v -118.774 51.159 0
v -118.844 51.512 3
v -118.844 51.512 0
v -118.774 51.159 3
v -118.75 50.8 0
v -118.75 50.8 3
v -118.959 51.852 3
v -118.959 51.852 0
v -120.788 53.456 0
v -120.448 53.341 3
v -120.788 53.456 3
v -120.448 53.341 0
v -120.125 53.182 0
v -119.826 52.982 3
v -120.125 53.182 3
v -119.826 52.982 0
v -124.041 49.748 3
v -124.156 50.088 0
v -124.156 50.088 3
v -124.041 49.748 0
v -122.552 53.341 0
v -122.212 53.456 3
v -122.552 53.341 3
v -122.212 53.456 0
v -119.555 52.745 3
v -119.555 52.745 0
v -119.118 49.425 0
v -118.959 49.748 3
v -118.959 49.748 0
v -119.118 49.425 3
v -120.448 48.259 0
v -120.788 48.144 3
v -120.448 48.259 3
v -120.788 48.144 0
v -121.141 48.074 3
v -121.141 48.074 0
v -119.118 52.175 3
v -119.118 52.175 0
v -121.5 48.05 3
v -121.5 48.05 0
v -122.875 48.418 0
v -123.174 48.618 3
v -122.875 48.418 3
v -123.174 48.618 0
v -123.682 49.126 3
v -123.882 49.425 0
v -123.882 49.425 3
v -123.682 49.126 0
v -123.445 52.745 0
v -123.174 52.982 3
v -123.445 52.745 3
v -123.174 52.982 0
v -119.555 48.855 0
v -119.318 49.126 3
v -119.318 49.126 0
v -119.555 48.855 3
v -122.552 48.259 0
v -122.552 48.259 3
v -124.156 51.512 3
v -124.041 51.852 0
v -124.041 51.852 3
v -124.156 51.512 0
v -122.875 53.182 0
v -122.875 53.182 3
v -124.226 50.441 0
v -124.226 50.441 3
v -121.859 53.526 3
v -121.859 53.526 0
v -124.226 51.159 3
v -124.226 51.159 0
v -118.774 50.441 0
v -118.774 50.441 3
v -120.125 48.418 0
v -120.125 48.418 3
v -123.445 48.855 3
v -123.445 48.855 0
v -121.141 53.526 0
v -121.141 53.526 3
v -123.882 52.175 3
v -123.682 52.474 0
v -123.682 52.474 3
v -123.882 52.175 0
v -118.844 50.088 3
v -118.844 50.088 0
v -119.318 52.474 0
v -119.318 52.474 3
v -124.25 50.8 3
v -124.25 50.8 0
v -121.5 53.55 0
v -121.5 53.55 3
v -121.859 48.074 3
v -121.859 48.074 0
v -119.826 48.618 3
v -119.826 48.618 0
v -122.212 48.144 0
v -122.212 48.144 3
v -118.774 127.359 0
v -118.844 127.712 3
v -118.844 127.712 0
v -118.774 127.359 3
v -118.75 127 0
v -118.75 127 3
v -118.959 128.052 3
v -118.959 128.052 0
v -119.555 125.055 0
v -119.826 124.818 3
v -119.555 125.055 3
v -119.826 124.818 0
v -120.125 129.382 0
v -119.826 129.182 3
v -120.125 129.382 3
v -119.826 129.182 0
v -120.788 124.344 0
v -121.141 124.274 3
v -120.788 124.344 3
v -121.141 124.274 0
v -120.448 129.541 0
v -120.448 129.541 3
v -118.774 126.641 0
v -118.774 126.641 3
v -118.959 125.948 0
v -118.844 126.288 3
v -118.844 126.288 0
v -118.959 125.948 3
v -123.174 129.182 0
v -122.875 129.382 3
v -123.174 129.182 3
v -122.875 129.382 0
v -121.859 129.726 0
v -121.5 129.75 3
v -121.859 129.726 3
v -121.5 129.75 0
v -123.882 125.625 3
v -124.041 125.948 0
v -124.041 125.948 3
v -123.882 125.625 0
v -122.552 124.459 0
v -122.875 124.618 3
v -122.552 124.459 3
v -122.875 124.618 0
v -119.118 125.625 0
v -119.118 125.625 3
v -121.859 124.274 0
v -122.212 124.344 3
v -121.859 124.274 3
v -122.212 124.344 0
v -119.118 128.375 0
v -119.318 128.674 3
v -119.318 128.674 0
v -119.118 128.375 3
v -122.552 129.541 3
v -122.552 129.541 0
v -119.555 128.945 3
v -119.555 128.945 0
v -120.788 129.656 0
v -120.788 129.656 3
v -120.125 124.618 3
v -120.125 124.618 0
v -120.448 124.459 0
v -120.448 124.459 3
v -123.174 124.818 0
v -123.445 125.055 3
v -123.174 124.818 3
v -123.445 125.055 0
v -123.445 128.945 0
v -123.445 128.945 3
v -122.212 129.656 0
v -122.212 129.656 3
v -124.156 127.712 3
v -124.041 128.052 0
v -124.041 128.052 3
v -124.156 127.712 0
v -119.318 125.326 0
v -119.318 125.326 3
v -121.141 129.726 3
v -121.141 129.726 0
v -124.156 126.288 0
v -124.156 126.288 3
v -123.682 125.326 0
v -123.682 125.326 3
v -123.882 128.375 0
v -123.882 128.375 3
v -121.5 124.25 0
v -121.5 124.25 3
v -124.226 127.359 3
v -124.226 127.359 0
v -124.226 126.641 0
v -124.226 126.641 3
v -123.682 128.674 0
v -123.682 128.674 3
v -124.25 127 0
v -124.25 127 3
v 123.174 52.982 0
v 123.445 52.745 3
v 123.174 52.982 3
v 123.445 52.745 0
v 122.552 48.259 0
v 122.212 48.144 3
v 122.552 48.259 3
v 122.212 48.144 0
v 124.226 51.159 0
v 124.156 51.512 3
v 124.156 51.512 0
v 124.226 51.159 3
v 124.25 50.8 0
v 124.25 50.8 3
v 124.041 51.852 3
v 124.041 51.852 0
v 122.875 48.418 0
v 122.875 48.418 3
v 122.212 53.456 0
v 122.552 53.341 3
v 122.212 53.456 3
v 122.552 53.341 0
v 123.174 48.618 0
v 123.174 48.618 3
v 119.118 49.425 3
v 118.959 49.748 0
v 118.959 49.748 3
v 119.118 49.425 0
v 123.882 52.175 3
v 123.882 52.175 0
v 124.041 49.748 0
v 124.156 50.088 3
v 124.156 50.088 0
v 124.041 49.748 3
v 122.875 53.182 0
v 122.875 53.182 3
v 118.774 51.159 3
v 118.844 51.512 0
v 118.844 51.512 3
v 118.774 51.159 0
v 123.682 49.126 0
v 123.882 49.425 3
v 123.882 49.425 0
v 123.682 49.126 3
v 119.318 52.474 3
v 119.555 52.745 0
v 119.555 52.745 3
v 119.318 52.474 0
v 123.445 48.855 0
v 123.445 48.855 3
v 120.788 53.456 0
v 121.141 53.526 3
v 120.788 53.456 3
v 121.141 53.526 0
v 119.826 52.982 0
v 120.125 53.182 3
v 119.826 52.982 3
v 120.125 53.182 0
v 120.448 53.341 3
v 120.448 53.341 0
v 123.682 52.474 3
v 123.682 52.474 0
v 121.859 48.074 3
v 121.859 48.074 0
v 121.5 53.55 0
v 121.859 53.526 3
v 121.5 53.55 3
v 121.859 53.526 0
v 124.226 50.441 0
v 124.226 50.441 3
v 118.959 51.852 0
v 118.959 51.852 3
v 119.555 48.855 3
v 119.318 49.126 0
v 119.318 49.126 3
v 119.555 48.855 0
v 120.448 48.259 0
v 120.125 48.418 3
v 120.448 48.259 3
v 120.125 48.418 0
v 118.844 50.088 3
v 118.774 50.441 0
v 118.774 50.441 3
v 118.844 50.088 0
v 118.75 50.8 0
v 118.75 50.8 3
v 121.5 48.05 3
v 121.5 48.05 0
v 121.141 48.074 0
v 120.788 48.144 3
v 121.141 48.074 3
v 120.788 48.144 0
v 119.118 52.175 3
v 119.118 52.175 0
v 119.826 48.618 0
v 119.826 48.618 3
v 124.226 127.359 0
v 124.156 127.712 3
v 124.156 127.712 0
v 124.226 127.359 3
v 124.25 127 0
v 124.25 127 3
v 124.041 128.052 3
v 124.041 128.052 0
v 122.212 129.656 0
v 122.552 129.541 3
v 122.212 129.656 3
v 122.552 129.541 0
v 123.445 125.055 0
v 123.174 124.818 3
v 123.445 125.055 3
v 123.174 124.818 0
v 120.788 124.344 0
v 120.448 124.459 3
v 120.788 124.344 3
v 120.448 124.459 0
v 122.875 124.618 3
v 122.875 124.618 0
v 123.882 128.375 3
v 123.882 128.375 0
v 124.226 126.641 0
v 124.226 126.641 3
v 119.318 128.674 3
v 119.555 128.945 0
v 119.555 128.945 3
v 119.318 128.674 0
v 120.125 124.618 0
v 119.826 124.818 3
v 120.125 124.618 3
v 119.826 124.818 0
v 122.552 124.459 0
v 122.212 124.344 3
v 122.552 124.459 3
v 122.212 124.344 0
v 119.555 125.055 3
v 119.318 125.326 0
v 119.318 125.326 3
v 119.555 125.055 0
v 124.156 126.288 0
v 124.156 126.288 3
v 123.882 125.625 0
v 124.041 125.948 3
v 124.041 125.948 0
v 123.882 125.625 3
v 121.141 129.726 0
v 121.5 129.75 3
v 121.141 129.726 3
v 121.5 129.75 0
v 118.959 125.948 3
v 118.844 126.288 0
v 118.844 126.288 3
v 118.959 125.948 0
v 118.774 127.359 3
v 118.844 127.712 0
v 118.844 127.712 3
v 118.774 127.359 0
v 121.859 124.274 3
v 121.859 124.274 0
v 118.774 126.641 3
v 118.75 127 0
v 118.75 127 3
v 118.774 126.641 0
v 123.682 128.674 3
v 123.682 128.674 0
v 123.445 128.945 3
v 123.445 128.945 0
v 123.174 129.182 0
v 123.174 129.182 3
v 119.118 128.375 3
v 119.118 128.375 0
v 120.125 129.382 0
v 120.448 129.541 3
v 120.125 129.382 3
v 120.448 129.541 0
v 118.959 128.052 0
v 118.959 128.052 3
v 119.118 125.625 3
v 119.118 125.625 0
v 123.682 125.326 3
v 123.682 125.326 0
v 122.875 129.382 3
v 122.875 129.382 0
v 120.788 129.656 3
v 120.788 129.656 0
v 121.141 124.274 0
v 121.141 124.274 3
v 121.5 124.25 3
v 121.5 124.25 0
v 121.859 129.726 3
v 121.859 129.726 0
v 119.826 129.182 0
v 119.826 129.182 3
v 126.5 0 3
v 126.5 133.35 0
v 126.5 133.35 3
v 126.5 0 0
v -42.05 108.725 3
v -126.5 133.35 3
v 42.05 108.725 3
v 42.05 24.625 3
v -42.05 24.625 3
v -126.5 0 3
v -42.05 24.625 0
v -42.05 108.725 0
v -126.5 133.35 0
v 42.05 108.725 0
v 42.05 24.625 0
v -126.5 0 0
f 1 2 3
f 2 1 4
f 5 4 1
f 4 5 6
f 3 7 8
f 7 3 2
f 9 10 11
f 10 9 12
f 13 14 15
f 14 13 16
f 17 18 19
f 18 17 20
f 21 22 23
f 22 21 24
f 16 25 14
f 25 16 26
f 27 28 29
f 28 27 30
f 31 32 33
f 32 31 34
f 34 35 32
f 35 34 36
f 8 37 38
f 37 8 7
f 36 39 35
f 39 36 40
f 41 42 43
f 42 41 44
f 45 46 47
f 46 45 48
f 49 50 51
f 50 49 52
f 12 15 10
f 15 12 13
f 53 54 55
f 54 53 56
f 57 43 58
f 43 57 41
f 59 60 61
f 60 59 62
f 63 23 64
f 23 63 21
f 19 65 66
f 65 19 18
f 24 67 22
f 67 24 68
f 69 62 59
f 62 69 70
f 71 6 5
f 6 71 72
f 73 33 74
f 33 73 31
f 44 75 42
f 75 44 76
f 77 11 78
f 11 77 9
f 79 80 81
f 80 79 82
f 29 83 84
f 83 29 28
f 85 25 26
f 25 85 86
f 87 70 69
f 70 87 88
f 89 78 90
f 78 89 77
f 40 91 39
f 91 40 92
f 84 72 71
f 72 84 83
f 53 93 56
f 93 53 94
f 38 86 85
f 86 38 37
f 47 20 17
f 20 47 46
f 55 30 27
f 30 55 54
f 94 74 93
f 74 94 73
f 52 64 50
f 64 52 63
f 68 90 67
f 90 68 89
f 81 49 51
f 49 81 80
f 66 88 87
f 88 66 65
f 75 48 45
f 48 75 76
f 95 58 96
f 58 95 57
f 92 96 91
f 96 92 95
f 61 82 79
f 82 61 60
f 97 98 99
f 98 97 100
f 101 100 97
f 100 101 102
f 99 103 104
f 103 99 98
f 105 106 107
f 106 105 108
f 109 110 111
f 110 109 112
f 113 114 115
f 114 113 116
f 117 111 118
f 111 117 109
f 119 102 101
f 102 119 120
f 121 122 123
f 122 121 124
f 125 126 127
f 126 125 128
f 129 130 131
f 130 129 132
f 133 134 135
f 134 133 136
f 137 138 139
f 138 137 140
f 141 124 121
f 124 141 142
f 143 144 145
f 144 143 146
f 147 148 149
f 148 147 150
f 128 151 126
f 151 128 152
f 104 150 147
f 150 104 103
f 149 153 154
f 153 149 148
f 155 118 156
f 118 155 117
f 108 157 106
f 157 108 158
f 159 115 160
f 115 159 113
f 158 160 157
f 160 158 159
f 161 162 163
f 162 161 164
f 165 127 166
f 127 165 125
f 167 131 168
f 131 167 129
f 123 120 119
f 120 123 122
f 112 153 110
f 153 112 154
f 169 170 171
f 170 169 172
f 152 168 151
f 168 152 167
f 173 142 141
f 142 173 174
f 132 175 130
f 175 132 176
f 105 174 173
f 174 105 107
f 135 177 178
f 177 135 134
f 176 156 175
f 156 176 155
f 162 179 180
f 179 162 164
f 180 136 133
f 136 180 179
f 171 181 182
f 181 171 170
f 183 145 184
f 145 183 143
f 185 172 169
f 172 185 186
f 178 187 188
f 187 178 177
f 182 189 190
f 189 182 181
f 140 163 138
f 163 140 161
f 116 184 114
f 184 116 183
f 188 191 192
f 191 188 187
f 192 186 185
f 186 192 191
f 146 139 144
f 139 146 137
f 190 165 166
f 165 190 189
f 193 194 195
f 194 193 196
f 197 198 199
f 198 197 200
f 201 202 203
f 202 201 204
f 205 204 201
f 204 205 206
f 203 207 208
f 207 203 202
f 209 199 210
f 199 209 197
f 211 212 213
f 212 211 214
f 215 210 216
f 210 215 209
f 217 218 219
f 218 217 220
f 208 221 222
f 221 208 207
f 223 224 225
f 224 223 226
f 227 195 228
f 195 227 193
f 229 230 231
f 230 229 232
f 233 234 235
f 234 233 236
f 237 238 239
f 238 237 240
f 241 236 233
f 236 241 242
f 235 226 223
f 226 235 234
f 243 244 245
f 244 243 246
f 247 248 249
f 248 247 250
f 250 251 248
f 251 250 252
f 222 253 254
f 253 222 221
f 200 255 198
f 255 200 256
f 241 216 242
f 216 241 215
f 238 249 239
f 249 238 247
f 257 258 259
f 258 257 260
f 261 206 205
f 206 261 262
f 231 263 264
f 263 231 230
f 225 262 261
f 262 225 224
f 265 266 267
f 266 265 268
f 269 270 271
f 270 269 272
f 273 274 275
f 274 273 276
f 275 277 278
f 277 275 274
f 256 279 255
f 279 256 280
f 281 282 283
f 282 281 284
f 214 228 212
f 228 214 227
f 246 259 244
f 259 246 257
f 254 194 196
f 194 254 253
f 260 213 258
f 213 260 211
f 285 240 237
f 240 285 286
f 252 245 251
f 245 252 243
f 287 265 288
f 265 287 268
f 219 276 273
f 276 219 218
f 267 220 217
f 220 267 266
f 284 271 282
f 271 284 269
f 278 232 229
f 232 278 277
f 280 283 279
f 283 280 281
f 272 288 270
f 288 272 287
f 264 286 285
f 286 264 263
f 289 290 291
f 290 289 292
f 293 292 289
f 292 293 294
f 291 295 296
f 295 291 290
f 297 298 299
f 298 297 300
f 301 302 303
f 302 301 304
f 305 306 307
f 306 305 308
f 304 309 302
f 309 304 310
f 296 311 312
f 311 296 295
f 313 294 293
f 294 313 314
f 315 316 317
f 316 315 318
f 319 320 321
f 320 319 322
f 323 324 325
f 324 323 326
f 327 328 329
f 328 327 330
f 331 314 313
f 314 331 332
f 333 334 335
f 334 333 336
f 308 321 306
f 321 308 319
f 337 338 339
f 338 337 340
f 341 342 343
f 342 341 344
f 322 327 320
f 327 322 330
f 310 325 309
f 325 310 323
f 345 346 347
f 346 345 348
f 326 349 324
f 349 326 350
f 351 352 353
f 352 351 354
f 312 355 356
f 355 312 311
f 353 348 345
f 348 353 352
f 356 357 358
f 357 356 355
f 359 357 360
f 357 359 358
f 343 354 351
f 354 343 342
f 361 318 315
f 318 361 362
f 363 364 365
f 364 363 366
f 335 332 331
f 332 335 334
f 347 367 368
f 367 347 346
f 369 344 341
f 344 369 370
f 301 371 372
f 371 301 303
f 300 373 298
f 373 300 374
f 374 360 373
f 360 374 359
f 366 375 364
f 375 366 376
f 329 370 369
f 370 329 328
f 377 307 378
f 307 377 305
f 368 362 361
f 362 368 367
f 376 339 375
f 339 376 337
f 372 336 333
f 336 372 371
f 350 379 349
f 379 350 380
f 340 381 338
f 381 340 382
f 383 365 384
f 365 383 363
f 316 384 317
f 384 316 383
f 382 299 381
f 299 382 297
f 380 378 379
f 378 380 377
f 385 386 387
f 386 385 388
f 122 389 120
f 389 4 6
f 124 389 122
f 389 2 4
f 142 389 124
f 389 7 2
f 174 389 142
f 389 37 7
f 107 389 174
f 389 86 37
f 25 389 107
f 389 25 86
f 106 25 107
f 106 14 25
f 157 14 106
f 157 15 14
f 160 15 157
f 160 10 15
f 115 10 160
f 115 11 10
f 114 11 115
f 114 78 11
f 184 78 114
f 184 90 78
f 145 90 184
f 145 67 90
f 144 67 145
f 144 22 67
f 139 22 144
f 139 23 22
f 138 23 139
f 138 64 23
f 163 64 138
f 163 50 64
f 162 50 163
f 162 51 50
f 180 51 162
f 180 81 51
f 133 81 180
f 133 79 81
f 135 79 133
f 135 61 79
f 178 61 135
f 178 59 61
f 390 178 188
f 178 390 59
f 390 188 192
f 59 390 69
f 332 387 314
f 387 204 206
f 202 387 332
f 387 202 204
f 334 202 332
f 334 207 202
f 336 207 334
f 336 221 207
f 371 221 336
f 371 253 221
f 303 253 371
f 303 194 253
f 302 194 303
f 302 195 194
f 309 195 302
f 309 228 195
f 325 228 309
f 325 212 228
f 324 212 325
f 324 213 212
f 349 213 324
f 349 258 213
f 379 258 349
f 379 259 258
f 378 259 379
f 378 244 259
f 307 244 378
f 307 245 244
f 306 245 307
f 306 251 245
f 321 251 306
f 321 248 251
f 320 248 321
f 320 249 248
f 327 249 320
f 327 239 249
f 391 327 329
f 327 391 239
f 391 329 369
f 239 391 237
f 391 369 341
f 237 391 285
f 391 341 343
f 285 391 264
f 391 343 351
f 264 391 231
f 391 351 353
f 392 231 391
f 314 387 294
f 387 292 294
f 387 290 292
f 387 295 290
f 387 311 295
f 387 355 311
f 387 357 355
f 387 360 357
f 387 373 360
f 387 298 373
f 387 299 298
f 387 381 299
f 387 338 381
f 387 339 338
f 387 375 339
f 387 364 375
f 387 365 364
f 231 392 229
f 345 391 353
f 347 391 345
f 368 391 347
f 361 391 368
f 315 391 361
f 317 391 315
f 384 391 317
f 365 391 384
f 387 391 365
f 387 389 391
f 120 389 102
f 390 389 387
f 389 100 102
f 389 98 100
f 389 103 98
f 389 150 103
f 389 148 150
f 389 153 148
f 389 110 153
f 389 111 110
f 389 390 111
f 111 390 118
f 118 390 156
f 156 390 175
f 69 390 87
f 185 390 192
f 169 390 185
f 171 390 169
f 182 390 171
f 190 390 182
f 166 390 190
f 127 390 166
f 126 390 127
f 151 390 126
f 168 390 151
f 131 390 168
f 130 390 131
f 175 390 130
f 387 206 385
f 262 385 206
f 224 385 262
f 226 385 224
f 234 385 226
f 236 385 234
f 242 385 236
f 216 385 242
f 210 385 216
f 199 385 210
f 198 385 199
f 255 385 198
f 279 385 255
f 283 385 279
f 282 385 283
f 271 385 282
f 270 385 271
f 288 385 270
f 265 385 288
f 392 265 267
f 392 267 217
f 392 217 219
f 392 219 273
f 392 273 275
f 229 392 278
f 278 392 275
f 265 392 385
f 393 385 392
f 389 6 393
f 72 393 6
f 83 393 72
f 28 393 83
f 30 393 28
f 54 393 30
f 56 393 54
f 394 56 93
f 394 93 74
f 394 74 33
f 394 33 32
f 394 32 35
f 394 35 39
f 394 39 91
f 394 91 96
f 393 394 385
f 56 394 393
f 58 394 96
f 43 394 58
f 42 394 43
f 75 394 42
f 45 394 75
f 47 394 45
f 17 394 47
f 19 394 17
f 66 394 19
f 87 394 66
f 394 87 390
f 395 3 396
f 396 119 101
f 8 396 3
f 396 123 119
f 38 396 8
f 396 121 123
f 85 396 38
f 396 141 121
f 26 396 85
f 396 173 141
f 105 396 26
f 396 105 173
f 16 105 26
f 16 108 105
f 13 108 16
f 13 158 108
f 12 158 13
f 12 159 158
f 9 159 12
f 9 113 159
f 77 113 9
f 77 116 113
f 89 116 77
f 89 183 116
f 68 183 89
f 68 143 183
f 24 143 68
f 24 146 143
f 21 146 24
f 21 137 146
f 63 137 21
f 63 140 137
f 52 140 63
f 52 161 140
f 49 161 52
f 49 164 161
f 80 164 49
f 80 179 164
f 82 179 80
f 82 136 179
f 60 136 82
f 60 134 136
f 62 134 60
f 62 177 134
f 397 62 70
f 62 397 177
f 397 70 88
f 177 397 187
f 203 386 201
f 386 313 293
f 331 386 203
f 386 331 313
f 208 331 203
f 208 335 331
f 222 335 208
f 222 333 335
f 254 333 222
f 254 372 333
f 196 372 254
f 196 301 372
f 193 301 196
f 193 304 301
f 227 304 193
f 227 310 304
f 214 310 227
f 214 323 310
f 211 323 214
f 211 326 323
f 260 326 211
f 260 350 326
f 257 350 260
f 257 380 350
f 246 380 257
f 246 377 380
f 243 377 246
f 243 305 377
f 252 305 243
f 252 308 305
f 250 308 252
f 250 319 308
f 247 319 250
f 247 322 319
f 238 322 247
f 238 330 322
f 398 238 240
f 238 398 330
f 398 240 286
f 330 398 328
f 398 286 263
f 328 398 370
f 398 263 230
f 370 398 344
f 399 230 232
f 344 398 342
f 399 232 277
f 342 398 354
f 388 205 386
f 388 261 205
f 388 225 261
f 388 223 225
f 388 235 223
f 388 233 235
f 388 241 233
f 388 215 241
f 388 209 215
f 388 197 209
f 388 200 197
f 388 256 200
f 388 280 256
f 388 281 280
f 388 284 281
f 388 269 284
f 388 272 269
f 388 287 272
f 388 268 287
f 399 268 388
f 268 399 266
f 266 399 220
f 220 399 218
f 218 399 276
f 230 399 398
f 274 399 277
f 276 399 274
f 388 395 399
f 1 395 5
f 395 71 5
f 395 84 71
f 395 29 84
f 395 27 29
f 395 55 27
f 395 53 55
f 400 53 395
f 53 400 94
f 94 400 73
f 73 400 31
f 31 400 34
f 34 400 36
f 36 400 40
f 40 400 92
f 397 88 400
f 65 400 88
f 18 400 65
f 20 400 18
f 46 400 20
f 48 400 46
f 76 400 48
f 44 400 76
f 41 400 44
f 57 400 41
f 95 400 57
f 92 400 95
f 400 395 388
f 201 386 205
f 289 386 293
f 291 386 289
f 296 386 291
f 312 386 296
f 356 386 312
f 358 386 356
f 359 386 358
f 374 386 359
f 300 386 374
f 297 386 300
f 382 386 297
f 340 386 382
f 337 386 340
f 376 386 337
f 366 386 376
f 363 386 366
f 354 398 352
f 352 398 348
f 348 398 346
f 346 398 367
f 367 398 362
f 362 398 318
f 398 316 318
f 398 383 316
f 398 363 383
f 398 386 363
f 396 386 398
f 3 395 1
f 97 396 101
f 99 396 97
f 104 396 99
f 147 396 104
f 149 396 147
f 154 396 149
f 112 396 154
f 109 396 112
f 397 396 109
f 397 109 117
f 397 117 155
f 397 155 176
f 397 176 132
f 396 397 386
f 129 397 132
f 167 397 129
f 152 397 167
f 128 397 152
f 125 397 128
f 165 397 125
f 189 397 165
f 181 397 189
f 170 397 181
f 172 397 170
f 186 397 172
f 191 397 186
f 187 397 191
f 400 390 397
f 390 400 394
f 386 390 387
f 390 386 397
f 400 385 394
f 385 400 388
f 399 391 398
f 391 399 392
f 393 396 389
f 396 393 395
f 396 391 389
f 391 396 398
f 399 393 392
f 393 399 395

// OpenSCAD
// =============================================================================
// CONSOLE10 — LCD Simple Faceplate  v0.1  (3U, single 84.1 × 84.1 cutout)
//
// 3U flat 3 mm faceplate that bolts to the cheek SLANT inserts. Single square
// cutout sized for an LCD. No rear sleeve, no clips, no other features.
//
// Origin: split off 2026-05-30 from the multi-device aux faceplate. The other
// devices (CF reader / SD holder / USB-C) moved to
// `Console10_aux_2u_faceplate.scad`.
// =============================================================================

// ---------- module geometry the plate must mate to ----------
panel_width   = 253;
cheek_thick   = 10;
slant_angle   = 30;
U             = 44.45;
interior_half = panel_width/2 - cheek_thick;   // 116.5
cheek_ctr_x   = interior_half + cheek_thick/2; // 121.5

// ---------- flat plate ----------
n_u      = 3;             // 3U faceplate (extends slant base to top)
plate_w  = 253;
plate_h  = n_u * U;       // 133.35
plate_t  = 3;

// ---------- LCD cutout ----------
lcd_w   = 84.1;           // panel-face width
lcd_h   = 84.1;           // panel-face height
lcd_cx  = 0;              // centered horizontally
lcd_cy  = plate_h/2;      // centered vertically

// ---------- slant-insert mount holes ----------
mount_y      = [50.80, 127.00];
m10_32_clear = 5.5;

show_on_slant = false;
floor_t       = 6;

$fn = 48;

echo(str("LCD SIMPLE FACEPLATE v0.1 ", plate_w, " x ", plate_h, " (", n_u, "U) t", plate_t,
         " | LCD cutout ", lcd_w, "x", lcd_h, " @ x=", lcd_cx, " y=", lcd_cy));

// =============================================================================
// PANEL
// =============================================================================
module panel() {
    difference() {
        translate([-plate_w/2, 0, 0]) cube([plate_w, plate_h, plate_t]);

        // LCD cutout
        translate([lcd_cx, lcd_cy, plate_t/2])
            cube([lcd_w, lcd_h, plate_t + 2], center = true);

        // Slant-insert mount screws — 2 per side
        for (sx = [-cheek_ctr_x, cheek_ctr_x])
            for (y = mount_y)
                translate([sx, y, -1]) cylinder(d = m10_32_clear, h = plate_t + 2);
    }
}

// Fit-check: tilt onto 30° slant.
module lcd_on_slant() {
    translate([0, 0, floor_t])
        rotate([90 - slant_angle, 0, 0])
            color("Gainsboro") panel();
}

// Public entry:
module lcd_simple_faceplate_on_slant() { lcd_on_slant(); }

if (show_on_slant) lcd_on_slant();
else               color("Gainsboro") panel();
